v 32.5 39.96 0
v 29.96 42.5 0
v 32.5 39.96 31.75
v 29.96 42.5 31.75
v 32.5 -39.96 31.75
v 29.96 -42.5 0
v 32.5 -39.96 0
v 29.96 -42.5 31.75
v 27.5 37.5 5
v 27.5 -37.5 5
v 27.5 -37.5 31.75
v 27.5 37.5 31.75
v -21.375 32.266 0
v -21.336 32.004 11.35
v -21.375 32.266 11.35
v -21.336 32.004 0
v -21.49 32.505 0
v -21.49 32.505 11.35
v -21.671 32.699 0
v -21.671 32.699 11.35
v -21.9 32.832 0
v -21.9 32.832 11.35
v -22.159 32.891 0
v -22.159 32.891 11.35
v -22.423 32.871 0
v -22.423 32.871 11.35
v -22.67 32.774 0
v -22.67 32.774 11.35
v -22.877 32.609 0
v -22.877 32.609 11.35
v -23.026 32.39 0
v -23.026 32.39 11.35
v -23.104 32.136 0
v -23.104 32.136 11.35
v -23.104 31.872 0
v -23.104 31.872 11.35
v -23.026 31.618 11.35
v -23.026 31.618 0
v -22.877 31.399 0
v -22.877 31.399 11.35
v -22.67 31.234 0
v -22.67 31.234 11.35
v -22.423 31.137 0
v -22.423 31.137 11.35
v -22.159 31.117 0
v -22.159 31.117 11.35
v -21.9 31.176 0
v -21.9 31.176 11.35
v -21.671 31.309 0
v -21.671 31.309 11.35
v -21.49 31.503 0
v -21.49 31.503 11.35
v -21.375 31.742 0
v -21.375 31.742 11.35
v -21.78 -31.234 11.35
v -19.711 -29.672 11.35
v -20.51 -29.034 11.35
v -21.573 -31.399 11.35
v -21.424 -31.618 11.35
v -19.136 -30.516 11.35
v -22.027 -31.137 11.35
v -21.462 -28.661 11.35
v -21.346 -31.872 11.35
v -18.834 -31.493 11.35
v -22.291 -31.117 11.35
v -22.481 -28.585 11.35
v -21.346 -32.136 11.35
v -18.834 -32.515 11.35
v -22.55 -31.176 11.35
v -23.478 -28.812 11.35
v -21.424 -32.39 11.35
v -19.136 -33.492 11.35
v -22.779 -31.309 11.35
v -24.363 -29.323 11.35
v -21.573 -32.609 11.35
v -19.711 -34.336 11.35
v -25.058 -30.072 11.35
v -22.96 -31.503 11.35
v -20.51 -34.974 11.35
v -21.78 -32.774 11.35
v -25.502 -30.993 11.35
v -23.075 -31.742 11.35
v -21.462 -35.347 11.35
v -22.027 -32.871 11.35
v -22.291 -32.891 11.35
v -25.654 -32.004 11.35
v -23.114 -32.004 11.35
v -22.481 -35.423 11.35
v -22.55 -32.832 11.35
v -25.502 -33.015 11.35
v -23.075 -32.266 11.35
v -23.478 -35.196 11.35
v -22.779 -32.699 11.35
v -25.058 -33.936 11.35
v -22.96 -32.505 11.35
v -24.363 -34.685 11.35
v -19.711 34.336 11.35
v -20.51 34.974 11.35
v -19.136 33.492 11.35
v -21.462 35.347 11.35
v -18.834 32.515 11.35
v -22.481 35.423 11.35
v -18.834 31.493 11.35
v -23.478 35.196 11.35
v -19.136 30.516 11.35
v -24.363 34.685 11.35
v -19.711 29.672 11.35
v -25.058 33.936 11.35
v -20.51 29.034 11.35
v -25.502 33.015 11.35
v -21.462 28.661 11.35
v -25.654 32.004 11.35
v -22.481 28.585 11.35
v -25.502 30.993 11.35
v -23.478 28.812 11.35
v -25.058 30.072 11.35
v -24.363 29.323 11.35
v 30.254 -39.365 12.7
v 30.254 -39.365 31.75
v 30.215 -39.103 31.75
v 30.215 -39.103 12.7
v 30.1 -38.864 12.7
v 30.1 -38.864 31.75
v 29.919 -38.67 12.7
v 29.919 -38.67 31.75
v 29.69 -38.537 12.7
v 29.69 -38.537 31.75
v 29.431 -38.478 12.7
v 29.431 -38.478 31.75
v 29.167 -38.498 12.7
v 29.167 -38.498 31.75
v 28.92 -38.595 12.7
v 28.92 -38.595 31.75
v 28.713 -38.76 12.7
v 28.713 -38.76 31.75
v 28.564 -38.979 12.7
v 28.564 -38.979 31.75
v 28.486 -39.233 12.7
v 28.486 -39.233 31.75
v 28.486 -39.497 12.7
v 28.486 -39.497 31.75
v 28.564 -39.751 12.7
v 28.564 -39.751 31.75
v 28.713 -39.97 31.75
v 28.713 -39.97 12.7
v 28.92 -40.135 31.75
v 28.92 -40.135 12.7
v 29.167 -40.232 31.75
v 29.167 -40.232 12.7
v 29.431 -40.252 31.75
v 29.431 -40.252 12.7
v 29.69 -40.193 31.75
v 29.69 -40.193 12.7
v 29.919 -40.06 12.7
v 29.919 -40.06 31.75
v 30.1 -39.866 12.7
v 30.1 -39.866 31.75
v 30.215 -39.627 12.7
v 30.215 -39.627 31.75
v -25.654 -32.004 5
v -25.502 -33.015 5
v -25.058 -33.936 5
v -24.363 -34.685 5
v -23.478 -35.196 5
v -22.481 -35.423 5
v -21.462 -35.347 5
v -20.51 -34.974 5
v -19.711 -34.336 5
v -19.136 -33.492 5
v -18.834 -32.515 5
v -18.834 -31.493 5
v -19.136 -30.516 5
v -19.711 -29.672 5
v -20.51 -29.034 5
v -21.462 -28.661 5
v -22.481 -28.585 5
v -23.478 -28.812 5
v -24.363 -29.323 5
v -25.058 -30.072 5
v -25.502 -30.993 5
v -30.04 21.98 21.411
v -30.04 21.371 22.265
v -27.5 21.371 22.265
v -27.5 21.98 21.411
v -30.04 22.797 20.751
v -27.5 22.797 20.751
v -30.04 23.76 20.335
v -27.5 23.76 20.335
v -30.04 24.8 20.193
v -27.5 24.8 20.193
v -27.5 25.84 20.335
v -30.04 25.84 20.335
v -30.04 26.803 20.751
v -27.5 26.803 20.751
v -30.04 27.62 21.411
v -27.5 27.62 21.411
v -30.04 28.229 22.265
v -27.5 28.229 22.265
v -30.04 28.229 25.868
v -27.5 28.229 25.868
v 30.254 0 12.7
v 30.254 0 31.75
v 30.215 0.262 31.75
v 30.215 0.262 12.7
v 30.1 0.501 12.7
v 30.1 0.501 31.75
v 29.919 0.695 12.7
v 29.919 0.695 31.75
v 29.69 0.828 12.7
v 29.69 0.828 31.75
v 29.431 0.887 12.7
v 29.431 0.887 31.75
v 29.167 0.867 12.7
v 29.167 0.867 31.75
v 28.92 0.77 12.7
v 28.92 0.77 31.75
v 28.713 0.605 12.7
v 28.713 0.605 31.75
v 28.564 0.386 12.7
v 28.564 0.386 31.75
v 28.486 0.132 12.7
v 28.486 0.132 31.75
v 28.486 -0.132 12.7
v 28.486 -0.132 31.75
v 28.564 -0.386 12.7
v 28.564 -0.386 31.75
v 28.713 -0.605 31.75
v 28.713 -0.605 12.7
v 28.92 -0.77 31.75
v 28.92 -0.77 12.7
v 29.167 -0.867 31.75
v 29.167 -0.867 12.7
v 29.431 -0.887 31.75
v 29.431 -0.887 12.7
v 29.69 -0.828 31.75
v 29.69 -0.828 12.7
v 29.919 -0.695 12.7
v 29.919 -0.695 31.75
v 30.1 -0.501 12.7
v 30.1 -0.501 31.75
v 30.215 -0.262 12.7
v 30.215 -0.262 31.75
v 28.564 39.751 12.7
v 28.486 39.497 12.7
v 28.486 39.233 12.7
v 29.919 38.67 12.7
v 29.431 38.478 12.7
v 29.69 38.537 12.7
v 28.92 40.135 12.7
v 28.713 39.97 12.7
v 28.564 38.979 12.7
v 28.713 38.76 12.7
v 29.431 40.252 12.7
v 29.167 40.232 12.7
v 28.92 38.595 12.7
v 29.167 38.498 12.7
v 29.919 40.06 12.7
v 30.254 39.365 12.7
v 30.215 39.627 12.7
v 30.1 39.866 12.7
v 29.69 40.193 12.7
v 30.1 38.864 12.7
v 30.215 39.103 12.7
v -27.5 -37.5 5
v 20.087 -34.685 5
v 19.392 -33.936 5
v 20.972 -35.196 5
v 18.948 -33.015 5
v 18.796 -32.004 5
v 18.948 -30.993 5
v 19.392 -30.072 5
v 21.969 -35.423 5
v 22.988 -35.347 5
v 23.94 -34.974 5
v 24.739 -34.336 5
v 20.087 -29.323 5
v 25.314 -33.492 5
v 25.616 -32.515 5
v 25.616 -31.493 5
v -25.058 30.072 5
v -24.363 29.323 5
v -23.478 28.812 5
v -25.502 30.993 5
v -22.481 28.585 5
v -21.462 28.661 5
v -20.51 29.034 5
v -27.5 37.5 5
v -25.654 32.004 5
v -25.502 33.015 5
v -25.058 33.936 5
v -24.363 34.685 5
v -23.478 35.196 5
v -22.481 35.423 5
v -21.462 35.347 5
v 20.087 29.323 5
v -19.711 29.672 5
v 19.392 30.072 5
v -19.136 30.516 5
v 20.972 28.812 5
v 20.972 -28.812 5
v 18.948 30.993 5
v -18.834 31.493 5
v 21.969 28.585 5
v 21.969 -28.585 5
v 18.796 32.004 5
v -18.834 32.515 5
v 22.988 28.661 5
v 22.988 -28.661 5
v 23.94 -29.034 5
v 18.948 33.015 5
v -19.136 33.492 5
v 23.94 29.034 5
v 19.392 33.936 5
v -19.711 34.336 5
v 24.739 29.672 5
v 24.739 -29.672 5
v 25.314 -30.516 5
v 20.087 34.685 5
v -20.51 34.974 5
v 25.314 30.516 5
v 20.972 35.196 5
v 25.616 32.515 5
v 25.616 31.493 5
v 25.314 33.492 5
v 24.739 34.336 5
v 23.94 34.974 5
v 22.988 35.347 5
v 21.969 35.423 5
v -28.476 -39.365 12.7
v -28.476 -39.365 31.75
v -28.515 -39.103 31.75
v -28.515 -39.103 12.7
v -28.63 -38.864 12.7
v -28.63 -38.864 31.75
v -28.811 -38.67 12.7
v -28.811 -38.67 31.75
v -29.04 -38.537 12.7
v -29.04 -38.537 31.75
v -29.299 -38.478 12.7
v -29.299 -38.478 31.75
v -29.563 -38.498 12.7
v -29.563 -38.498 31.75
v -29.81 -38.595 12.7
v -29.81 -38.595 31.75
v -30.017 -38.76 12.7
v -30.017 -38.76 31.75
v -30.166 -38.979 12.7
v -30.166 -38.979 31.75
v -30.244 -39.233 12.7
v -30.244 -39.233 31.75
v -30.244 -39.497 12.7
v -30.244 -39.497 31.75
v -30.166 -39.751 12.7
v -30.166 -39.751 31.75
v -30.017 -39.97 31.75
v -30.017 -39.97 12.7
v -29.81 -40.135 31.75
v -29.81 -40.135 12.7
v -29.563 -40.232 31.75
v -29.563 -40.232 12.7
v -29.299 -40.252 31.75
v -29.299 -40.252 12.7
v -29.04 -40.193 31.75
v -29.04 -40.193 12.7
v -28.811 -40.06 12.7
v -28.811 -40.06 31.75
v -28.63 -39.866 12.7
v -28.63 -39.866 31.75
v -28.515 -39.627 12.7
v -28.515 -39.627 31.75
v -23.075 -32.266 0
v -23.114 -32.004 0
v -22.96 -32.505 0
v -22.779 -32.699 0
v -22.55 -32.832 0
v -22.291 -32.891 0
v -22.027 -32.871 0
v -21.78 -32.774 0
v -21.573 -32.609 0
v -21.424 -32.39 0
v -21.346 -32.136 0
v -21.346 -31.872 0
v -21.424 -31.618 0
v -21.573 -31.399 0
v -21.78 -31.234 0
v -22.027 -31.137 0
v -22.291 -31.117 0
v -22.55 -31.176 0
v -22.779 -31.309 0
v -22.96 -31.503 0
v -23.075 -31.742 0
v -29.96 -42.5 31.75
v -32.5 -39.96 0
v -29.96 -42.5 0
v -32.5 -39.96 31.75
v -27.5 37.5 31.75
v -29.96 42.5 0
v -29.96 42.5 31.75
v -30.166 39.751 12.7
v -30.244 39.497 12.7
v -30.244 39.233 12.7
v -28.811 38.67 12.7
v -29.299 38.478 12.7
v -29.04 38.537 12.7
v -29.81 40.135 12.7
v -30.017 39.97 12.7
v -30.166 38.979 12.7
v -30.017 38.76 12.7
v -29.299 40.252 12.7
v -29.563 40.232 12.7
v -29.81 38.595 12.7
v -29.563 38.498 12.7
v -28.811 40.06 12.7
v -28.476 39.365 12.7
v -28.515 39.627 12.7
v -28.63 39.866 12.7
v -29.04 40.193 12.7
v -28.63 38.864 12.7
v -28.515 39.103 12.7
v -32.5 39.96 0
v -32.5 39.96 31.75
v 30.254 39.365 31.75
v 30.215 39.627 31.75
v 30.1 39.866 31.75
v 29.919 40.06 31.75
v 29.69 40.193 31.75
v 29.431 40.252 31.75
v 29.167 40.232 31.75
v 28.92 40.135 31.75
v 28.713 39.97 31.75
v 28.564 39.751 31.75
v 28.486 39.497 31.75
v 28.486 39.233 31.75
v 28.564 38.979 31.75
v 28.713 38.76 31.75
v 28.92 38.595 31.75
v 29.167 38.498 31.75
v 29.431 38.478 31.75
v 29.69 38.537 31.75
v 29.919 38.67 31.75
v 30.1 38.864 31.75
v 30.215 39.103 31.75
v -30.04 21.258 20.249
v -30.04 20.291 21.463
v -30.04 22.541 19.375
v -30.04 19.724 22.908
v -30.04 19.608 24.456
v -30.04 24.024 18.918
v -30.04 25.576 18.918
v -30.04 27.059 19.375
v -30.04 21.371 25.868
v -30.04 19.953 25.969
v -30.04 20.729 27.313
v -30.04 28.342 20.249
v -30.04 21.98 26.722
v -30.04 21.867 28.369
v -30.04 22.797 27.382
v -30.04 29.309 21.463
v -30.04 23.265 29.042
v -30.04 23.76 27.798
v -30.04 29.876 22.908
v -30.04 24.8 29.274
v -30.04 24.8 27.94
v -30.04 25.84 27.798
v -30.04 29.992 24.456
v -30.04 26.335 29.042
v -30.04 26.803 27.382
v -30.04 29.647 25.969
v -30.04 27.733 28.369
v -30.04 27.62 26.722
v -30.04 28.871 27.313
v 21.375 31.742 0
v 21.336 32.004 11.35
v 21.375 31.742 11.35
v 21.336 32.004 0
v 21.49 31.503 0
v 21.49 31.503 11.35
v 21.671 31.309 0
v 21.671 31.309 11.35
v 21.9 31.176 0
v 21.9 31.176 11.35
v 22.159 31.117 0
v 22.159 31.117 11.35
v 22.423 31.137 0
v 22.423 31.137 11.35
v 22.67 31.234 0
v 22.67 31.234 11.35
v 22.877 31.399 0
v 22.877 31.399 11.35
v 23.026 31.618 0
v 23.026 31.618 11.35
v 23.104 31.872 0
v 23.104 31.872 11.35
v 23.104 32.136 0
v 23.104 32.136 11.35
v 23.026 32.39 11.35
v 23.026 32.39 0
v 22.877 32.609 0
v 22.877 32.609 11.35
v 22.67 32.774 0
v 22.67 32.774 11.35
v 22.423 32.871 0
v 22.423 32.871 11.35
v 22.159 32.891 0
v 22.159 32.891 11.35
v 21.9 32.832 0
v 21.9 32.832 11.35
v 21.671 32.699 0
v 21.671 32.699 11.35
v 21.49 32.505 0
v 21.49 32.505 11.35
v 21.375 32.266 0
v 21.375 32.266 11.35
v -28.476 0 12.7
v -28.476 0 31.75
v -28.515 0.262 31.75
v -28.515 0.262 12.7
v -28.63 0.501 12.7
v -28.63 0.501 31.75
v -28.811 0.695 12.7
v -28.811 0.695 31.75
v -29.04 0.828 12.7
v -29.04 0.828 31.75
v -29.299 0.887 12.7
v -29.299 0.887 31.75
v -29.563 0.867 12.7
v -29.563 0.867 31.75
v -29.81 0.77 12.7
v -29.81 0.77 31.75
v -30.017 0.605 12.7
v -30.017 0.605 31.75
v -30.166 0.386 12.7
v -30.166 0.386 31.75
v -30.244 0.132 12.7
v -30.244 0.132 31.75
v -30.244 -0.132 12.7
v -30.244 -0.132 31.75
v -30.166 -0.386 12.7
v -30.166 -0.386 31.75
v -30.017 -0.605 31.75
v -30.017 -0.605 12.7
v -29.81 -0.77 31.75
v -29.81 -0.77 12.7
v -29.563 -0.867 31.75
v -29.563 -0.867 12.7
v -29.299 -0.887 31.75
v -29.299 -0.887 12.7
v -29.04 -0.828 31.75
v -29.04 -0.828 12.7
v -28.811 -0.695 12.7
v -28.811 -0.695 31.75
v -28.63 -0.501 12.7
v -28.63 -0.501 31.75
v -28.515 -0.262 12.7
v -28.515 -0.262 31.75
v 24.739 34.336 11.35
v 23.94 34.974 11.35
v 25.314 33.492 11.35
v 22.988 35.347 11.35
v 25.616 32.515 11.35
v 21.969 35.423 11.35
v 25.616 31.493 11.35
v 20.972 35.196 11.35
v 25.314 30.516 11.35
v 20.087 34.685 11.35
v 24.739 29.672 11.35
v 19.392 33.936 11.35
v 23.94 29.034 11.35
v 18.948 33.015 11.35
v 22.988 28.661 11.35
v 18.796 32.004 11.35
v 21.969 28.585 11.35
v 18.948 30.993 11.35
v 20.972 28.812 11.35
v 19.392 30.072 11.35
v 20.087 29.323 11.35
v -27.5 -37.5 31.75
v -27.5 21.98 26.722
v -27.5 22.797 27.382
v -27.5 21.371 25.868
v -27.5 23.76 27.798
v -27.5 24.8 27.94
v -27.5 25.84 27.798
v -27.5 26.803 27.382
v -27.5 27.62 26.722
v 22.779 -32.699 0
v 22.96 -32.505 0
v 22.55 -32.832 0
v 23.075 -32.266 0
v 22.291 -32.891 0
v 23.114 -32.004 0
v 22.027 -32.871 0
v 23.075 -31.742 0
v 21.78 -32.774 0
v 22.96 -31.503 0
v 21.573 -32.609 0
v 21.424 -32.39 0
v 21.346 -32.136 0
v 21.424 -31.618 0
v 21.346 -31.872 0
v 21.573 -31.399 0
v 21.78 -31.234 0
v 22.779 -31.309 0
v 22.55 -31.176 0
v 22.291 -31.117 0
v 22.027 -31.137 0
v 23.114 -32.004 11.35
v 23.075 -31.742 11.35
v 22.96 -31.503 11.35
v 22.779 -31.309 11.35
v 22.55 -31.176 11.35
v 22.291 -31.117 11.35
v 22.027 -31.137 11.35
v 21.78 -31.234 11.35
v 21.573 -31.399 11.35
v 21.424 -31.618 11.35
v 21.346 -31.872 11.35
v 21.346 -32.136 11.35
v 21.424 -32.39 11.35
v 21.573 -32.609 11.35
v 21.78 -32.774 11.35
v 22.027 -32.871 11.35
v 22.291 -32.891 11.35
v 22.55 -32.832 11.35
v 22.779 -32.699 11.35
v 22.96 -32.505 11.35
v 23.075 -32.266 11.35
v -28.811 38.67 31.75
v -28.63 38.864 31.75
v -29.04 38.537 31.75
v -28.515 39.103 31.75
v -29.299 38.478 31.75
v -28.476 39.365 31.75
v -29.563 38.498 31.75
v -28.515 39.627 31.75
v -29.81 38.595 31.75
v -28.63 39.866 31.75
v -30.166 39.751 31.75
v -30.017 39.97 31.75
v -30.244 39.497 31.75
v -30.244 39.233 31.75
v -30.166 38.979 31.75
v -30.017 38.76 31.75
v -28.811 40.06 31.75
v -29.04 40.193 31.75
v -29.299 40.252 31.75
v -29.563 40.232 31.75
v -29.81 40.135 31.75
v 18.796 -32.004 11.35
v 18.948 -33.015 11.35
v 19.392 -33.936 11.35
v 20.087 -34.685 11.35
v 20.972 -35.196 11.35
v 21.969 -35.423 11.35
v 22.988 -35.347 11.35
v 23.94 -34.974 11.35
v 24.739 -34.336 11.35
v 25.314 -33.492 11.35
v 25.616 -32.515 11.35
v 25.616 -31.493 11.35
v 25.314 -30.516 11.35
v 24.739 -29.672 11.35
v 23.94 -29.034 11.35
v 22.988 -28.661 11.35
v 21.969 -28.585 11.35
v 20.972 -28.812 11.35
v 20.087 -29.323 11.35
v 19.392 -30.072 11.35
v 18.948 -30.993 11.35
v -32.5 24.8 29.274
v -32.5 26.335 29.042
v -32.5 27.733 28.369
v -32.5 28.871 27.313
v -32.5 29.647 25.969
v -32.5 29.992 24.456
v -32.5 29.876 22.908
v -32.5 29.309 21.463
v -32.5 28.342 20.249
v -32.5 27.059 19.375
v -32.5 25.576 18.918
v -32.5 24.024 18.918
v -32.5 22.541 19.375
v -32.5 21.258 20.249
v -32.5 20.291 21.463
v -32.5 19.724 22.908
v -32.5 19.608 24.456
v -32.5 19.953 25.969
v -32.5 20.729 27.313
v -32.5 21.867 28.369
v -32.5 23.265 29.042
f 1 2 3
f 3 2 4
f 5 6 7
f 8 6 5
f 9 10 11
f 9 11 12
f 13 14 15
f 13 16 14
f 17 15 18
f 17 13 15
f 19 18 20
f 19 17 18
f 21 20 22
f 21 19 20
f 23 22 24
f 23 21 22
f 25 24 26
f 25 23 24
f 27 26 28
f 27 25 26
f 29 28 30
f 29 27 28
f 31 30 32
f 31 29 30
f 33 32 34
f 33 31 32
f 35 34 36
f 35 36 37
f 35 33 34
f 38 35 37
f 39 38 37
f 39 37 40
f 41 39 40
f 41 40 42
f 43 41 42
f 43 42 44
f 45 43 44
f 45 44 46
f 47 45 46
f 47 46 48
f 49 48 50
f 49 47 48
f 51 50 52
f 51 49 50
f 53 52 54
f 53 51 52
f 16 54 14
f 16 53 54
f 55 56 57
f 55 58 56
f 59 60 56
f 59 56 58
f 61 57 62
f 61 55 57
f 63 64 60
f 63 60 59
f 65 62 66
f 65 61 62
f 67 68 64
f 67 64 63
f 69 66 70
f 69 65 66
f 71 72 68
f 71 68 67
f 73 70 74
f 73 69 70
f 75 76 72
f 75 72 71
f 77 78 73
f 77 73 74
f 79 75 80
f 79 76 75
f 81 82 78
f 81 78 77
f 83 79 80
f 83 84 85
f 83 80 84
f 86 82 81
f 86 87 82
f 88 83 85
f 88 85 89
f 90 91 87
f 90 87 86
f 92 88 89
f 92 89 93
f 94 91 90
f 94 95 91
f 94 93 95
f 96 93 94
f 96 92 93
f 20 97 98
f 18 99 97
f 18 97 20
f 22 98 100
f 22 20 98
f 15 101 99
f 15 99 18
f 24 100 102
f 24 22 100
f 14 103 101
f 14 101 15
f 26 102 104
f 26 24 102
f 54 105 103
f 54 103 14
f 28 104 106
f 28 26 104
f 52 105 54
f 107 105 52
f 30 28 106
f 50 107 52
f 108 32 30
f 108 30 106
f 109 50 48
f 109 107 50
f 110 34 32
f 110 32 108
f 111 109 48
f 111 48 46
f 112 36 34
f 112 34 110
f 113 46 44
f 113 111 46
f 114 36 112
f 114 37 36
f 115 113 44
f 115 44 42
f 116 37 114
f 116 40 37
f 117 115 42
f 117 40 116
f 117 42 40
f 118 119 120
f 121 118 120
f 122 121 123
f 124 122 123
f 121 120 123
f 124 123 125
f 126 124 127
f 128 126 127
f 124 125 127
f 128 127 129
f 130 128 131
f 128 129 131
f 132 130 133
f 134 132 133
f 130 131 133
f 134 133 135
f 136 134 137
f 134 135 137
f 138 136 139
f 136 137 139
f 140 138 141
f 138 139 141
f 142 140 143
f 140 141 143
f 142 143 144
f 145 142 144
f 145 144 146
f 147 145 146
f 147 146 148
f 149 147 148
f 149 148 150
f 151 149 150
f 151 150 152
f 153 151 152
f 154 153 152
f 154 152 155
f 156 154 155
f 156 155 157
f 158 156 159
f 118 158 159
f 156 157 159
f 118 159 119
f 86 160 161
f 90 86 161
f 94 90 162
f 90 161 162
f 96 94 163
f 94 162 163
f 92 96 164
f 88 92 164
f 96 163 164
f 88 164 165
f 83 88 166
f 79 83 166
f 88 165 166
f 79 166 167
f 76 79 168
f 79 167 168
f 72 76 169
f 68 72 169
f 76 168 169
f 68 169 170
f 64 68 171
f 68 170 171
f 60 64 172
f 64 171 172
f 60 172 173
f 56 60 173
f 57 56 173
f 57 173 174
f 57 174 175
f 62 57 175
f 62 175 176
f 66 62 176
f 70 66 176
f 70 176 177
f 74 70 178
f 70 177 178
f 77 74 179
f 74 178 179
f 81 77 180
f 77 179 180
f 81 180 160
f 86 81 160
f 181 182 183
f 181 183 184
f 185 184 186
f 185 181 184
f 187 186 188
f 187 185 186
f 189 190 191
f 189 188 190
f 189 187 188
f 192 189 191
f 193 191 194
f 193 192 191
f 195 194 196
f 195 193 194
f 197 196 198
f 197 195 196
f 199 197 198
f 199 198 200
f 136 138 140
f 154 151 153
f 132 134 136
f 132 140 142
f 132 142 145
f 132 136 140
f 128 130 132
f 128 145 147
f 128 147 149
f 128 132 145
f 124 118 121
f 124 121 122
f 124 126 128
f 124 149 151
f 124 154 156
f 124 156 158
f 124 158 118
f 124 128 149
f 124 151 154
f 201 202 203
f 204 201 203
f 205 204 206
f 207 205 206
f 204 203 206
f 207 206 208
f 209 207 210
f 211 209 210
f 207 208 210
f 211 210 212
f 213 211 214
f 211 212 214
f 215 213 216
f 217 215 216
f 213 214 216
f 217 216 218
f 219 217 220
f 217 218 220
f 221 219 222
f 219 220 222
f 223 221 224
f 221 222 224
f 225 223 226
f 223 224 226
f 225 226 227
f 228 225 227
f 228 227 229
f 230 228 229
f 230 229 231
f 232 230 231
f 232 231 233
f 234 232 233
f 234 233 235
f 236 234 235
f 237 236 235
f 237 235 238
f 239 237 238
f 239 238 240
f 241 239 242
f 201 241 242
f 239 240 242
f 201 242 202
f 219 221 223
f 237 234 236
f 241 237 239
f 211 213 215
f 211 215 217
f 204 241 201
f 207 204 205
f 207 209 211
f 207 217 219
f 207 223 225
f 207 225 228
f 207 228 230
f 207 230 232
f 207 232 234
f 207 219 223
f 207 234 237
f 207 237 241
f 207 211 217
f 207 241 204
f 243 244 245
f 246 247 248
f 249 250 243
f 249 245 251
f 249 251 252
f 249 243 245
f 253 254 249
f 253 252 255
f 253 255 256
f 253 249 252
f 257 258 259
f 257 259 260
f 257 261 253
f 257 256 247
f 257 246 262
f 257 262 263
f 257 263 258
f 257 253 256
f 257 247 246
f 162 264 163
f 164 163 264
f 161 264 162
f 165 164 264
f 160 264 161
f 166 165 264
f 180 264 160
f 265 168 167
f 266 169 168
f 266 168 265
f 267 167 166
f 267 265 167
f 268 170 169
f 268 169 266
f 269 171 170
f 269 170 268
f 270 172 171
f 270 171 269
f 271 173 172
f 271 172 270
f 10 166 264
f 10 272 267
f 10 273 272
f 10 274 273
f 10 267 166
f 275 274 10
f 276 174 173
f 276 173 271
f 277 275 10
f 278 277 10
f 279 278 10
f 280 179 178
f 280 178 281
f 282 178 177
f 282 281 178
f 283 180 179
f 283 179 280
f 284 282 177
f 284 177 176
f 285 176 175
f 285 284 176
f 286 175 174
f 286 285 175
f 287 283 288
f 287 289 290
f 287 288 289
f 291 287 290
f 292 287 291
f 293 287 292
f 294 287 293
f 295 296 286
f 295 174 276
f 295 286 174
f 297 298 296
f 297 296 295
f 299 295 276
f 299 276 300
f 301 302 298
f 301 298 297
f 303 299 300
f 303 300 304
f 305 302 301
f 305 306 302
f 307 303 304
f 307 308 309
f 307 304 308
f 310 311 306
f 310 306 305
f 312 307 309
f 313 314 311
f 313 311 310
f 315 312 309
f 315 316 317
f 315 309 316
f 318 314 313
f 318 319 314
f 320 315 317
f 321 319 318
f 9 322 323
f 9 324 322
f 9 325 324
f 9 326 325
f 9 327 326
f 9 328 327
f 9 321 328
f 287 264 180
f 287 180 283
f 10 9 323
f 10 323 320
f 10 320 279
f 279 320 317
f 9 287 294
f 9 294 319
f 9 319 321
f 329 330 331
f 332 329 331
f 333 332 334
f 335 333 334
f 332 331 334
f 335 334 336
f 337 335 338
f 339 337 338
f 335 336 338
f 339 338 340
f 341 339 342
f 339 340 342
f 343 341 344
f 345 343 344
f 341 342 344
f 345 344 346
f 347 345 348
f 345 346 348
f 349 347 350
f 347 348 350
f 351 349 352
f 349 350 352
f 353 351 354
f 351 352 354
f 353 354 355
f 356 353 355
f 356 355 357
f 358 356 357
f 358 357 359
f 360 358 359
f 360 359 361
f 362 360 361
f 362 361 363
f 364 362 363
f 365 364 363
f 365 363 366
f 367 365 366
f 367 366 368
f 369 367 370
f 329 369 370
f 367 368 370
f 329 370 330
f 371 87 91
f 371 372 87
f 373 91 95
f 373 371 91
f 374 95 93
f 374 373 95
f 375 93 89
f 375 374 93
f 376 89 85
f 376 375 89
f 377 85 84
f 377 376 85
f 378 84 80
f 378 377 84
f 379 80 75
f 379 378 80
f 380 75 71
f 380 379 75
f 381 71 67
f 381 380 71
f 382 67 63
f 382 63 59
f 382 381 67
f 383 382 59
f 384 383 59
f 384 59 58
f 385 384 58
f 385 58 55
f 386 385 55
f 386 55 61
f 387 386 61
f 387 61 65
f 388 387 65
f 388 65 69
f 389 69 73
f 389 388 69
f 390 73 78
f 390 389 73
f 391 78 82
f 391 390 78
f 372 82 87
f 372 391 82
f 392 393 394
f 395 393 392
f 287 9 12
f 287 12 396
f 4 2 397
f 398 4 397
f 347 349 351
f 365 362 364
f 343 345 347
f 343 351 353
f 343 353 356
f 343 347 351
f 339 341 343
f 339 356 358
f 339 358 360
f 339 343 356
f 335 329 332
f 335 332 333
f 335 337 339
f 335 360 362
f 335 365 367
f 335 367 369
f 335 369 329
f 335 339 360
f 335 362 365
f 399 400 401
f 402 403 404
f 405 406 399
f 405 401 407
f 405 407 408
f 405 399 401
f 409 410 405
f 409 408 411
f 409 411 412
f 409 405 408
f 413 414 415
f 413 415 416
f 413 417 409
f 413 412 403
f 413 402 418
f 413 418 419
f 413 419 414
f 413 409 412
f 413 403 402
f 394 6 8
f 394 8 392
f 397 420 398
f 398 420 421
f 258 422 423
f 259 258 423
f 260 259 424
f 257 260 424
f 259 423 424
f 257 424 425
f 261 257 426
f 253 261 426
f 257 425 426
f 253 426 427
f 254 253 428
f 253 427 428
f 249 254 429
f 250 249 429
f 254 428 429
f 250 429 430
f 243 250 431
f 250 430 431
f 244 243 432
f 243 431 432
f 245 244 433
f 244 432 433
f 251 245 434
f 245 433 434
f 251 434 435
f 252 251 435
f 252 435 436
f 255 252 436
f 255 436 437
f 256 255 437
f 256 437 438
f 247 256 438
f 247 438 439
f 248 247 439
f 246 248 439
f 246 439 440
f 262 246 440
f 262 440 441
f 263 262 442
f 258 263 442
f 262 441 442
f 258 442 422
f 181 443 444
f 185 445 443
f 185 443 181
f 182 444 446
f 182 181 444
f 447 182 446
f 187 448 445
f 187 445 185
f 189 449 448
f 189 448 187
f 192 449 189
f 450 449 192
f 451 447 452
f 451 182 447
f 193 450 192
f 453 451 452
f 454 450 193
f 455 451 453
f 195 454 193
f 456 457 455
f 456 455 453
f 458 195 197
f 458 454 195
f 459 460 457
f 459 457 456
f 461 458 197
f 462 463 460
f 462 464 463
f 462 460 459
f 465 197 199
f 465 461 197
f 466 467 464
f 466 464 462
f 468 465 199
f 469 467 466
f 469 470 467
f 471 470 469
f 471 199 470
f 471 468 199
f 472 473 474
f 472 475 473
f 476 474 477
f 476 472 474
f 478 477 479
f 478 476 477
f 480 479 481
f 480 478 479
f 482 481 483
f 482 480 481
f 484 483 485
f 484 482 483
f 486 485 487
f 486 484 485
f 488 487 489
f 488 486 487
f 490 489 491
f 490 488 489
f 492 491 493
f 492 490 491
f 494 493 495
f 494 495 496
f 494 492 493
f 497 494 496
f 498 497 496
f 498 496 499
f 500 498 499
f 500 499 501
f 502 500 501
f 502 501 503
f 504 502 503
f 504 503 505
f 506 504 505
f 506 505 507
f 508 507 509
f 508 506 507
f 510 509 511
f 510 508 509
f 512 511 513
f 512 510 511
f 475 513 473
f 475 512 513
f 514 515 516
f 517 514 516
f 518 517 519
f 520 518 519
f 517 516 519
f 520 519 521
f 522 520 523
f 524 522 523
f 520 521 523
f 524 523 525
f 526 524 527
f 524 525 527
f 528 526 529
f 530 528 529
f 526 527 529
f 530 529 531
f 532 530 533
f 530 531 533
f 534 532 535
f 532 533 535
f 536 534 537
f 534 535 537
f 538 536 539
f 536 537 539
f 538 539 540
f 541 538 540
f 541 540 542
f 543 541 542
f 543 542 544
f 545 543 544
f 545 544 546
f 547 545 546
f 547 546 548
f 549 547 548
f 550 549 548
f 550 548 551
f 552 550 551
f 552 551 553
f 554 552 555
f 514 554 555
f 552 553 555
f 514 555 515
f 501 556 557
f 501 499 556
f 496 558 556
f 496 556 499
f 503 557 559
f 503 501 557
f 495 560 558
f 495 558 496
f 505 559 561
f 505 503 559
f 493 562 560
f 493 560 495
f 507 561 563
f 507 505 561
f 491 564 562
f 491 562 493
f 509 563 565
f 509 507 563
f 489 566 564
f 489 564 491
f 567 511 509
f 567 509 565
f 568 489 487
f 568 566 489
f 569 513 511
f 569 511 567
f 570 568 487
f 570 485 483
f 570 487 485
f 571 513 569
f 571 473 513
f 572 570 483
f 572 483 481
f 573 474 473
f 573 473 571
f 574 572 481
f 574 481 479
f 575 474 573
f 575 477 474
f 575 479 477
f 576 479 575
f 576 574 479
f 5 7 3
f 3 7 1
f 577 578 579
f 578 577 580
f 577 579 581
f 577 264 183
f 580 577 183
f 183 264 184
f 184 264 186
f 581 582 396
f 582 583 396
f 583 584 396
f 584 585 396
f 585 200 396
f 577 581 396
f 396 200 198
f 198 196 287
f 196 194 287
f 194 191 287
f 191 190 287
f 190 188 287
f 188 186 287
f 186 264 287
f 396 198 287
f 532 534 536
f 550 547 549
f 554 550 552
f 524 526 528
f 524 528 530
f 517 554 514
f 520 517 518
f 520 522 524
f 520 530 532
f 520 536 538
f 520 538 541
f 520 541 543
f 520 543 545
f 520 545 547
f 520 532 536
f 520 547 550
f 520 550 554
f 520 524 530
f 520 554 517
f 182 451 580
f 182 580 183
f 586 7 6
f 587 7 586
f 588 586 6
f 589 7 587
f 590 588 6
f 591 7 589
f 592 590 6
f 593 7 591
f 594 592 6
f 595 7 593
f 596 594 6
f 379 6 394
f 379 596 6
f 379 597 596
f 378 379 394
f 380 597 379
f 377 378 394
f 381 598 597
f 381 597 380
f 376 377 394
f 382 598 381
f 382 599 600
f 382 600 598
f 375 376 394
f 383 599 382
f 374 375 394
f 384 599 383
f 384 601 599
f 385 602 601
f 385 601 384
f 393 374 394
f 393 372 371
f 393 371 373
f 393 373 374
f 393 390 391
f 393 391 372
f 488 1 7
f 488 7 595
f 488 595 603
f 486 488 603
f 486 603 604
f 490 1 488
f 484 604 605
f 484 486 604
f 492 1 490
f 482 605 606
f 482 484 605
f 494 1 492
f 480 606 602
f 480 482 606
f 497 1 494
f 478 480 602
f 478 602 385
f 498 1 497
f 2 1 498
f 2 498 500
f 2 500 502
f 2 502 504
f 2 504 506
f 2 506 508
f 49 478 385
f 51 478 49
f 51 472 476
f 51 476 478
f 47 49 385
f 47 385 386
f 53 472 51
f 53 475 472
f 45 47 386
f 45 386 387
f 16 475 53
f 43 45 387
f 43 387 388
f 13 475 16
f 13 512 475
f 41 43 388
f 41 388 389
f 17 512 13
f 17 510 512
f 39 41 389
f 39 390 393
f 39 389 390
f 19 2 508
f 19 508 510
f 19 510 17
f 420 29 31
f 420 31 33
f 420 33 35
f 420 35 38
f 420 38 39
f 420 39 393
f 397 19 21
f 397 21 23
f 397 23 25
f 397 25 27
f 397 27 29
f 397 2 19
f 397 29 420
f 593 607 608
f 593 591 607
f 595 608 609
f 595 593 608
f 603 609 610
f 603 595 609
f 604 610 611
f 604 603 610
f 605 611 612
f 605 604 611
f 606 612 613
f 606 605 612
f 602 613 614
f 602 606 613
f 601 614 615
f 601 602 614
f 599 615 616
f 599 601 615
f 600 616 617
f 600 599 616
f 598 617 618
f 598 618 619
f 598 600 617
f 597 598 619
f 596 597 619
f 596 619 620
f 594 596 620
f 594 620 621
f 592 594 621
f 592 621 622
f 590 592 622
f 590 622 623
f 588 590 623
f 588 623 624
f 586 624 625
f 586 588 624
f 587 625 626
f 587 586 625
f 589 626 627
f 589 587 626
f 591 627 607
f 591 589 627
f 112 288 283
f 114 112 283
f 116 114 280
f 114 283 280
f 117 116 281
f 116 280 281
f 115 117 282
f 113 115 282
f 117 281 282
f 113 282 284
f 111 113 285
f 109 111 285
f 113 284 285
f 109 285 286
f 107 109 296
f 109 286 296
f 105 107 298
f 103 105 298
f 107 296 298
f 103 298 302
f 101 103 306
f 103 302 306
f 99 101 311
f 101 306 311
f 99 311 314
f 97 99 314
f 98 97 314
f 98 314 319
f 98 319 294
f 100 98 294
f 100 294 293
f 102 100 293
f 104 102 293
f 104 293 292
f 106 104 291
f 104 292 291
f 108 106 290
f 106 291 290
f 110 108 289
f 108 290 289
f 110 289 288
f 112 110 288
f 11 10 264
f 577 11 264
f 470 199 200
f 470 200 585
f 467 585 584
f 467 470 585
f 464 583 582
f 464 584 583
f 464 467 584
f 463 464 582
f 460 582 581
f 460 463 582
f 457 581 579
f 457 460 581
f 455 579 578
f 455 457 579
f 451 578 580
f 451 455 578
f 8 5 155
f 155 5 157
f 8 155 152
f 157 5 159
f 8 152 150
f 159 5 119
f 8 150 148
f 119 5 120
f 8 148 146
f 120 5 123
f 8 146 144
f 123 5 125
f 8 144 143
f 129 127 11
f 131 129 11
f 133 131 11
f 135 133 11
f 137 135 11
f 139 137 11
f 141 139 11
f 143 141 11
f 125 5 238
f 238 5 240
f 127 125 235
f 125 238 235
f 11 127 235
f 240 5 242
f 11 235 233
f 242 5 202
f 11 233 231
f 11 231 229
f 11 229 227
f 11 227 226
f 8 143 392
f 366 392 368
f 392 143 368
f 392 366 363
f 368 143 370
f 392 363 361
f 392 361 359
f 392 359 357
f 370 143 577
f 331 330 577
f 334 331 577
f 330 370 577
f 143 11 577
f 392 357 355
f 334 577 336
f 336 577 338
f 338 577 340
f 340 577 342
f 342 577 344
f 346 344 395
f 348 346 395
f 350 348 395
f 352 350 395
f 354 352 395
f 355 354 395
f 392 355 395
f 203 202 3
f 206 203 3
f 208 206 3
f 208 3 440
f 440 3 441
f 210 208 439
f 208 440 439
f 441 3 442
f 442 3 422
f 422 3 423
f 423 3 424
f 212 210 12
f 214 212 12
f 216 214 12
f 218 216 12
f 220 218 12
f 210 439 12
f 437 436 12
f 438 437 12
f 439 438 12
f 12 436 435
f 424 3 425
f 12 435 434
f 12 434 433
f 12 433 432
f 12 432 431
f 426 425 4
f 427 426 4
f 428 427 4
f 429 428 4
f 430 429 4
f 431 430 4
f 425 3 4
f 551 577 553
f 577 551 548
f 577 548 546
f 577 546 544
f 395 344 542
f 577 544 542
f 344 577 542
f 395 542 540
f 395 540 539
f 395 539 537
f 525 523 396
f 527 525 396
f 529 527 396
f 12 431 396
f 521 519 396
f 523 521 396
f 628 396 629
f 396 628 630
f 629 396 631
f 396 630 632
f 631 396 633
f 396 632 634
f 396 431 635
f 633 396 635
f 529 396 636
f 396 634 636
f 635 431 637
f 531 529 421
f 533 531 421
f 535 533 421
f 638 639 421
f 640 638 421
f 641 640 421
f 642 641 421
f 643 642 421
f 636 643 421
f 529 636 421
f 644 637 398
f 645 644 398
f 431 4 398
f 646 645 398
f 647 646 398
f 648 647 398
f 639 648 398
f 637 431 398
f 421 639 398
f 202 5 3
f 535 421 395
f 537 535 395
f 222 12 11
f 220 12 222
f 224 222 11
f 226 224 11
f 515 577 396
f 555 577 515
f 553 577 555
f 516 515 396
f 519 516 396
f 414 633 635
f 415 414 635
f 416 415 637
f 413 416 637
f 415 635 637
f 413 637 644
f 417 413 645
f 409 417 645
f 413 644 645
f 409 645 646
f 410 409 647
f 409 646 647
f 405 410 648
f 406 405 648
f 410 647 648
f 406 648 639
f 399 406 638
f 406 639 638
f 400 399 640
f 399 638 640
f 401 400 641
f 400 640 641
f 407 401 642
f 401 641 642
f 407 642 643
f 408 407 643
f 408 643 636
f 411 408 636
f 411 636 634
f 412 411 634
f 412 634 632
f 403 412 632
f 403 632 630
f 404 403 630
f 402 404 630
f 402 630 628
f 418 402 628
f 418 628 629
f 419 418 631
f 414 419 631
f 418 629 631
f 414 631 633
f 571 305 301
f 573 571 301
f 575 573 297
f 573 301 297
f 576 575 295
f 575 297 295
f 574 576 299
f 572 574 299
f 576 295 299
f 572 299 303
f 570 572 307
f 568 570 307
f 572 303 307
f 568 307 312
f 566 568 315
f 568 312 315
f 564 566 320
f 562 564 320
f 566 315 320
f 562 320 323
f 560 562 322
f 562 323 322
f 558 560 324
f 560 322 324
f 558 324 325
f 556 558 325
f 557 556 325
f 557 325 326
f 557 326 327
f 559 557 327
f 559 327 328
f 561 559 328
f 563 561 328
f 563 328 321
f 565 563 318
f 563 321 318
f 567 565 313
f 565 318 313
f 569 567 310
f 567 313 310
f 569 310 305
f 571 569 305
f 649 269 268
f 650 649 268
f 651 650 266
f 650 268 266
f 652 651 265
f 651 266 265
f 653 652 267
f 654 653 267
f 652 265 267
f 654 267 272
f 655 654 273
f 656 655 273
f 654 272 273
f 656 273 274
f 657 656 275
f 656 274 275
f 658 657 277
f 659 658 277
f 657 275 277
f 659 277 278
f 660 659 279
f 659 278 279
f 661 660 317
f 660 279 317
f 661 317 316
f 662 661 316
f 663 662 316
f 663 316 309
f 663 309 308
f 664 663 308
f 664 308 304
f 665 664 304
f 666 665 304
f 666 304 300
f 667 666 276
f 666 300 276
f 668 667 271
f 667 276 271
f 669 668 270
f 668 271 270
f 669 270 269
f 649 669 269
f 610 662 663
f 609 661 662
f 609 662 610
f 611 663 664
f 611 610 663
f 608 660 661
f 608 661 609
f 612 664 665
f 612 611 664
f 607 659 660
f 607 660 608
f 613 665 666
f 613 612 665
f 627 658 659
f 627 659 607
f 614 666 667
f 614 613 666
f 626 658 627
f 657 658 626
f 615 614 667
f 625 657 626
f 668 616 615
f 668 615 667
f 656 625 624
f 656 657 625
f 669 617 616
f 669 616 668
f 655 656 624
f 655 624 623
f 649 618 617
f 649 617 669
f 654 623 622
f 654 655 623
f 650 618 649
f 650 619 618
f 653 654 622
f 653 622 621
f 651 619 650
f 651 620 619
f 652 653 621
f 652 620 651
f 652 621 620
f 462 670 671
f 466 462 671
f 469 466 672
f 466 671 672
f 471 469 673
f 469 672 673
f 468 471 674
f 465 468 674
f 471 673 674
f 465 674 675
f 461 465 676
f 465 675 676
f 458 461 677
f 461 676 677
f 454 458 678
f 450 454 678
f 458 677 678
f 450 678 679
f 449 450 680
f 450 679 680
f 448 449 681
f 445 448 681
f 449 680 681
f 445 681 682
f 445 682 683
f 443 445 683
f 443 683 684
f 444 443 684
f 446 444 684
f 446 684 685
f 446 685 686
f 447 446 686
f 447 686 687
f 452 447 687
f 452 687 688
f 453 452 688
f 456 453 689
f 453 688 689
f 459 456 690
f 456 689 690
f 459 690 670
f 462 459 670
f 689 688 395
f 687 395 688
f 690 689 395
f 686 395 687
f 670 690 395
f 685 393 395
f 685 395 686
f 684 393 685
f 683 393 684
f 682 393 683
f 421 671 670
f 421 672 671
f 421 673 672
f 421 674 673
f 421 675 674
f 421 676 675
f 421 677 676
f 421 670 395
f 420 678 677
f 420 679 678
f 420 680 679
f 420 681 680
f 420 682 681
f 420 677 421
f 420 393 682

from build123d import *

# Parameters (mm, degrees)
SKETCH1_W           = 55
SKETCH1_H           = 75
SKETCH1_R           = 0.889
BOSS_EXTRUDE1_DEPTH = 5
SKETCH2_W           = 65
SKETCH2_H           = 85
SKETCH2_W_2         = 55
SKETCH2_H_2         = 75
BOSS_EXTRUDE2_DEPTH = 31.75
CUT_EXTRUDE1_REACH  = 85.901
SKETCH4_R           = 5.207
CUT_EXTRUDE2_DEPTH  = 2.46
CHAMFER1_SIZE       = 2.54
SKETCH5_R           = 0.889
CUT_EXTRUDE3_DEPTH  = 19.05
SKETCH6_R           = 3.429
SKETCH6_R_2         = 0.889
BOSS_EXTRUDE3_DEPTH = 6.35


with BuildPart() as part:
    # Sketch1 → Boss-Extrude1 (new body)
    with BuildSketch(Plane.XY):
        Rectangle(SKETCH1_W, SKETCH1_H)
        with Locations((-22.225, 32.004)):
            Circle(SKETCH1_R, mode=Mode.SUBTRACT)
        with Locations(Location((-22.225, -32.004, 0), (0, 0, 180))):
            Circle(SKETCH1_R, mode=Mode.SUBTRACT)
        with Locations((22.225, -32.004)):
            Circle(SKETCH1_R, mode=Mode.SUBTRACT)
        with Locations(Location((22.225, 32.004, 0), (0, 0, 180))):
            Circle(SKETCH1_R, mode=Mode.SUBTRACT)
    extrude(amount=BOSS_EXTRUDE1_DEPTH)

    # Sketch2 → Boss-Extrude2 (add)
    with BuildSketch(Plane(origin=(0, 0, 0), x_dir=(-1, 0, 0), z_dir=(0, 0, -1))):
        Rectangle(SKETCH2_W, SKETCH2_H)
        Rectangle(SKETCH2_W_2, SKETCH2_H_2, mode=Mode.SUBTRACT)
    extrude(amount=-BOSS_EXTRUDE2_DEPTH)

    # Sketch3 → Cut-Extrude1 (cut, up to next)
    with BuildSketch(Plane.ZY.offset(32.5), mode=Mode.PRIVATE) as cut_extrude1_sk1:
        with BuildLine():
            Line((25.868155142, 21.371), (22.264844858, 21.371))
            ThreePointArc((22.264844858, 21.371), (20.193, 24.8), (22.264844858, 28.229))
            Line((22.264844858, 28.229), (25.868155142, 28.229))
            ThreePointArc((25.868155142, 28.229), (27.94, 24.8), (25.868155142, 21.371))
        make_face()
    cut_extrude1_tool1 = extrude(cut_extrude1_sk1.sketch, amount=-CUT_EXTRUDE1_REACH, mode=Mode.PRIVATE) & part.part
    add(cut_extrude1_tool1.solids().sort_by_distance((-32.5, 24.8, 24.0665))[0], mode=Mode.SUBTRACT)

    # Sketch4 → Cut-Extrude2 (cut)
    with BuildSketch(Plane.ZY.offset(32.5)):
        with Locations((24.0665, 24.8)):
            Circle(SKETCH4_R)
    extrude(amount=-CUT_EXTRUDE2_DEPTH, mode=Mode.SUBTRACT)

    # Chamfer1
    chamfer1_edges = [part.edges().sort_by_distance(p)[0] for p in [
        (32.5, 42.5, 15.875),
        (-32.5, 42.5, 15.875),
        (-32.5, -42.5, 15.875),
        (32.5, -42.5, 15.875),
    ]]
    chamfer(chamfer1_edges, length=CHAMFER1_SIZE)

    # Sketch5 → Cut-Extrude3 (cut)
    with BuildSketch(Plane.XY.offset(31.75)):
        with Locations((29.365, 39.365)):
            Circle(SKETCH5_R)
        with Locations((29.365, -39.365)):
            Circle(SKETCH5_R)
        with Locations((-29.365, -39.365)):
            Circle(SKETCH5_R)
        with Locations((-29.365, 39.365)):
            Circle(SKETCH5_R)
        with Locations((29.365, 0)):
            Circle(SKETCH5_R)
        with Locations((-29.365, 0)):
            Circle(SKETCH5_R)
    extrude(amount=-CUT_EXTRUDE3_DEPTH, mode=Mode.SUBTRACT)

    # Sketch6 → Boss-Extrude3 (add)
    # profile 1 of 4: a face of its own
    with BuildSketch(Plane.XY.offset(5)):
        with Locations(Location((-22.225, 32.004, 0), (0, 0, 180))):
            Circle(SKETCH6_R)
        with Locations((-22.225, 32.004)):
            Circle(SKETCH6_R_2, mode=Mode.SUBTRACT)
    # profile 2 of 4: a face of its own
    with BuildSketch(Plane.XY.offset(5)):
        with Locations(Location((-22.225, -32.004, 0), (0, 0, 180))):
            Circle(SKETCH6_R)
        with Locations(Location((-22.225, -32.004, 0), (0, 0, 180))):
            Circle(SKETCH6_R_2, mode=Mode.SUBTRACT)
    # profile 3 of 4: a face of its own
    with BuildSketch(Plane.XY.offset(5)):
        with Locations(Location((22.225, -32.004, 0), (0, 0, 180))):
            Circle(SKETCH6_R)
        with Locations((22.225, -32.004)):
            Circle(SKETCH6_R_2, mode=Mode.SUBTRACT)
    # profile 4 of 4: a face of its own
    with BuildSketch(Plane.XY.offset(5)):
        with Locations(Location((22.225, 32.004, 0), (0, 0, 180))):
            Circle(SKETCH6_R)
        with Locations(Location((22.225, 32.004, 0), (0, 0, 180))):
            Circle(SKETCH6_R_2, mode=Mode.SUBTRACT)
    extrude(amount=BOSS_EXTRUDE3_DEPTH)


solid = part.part
